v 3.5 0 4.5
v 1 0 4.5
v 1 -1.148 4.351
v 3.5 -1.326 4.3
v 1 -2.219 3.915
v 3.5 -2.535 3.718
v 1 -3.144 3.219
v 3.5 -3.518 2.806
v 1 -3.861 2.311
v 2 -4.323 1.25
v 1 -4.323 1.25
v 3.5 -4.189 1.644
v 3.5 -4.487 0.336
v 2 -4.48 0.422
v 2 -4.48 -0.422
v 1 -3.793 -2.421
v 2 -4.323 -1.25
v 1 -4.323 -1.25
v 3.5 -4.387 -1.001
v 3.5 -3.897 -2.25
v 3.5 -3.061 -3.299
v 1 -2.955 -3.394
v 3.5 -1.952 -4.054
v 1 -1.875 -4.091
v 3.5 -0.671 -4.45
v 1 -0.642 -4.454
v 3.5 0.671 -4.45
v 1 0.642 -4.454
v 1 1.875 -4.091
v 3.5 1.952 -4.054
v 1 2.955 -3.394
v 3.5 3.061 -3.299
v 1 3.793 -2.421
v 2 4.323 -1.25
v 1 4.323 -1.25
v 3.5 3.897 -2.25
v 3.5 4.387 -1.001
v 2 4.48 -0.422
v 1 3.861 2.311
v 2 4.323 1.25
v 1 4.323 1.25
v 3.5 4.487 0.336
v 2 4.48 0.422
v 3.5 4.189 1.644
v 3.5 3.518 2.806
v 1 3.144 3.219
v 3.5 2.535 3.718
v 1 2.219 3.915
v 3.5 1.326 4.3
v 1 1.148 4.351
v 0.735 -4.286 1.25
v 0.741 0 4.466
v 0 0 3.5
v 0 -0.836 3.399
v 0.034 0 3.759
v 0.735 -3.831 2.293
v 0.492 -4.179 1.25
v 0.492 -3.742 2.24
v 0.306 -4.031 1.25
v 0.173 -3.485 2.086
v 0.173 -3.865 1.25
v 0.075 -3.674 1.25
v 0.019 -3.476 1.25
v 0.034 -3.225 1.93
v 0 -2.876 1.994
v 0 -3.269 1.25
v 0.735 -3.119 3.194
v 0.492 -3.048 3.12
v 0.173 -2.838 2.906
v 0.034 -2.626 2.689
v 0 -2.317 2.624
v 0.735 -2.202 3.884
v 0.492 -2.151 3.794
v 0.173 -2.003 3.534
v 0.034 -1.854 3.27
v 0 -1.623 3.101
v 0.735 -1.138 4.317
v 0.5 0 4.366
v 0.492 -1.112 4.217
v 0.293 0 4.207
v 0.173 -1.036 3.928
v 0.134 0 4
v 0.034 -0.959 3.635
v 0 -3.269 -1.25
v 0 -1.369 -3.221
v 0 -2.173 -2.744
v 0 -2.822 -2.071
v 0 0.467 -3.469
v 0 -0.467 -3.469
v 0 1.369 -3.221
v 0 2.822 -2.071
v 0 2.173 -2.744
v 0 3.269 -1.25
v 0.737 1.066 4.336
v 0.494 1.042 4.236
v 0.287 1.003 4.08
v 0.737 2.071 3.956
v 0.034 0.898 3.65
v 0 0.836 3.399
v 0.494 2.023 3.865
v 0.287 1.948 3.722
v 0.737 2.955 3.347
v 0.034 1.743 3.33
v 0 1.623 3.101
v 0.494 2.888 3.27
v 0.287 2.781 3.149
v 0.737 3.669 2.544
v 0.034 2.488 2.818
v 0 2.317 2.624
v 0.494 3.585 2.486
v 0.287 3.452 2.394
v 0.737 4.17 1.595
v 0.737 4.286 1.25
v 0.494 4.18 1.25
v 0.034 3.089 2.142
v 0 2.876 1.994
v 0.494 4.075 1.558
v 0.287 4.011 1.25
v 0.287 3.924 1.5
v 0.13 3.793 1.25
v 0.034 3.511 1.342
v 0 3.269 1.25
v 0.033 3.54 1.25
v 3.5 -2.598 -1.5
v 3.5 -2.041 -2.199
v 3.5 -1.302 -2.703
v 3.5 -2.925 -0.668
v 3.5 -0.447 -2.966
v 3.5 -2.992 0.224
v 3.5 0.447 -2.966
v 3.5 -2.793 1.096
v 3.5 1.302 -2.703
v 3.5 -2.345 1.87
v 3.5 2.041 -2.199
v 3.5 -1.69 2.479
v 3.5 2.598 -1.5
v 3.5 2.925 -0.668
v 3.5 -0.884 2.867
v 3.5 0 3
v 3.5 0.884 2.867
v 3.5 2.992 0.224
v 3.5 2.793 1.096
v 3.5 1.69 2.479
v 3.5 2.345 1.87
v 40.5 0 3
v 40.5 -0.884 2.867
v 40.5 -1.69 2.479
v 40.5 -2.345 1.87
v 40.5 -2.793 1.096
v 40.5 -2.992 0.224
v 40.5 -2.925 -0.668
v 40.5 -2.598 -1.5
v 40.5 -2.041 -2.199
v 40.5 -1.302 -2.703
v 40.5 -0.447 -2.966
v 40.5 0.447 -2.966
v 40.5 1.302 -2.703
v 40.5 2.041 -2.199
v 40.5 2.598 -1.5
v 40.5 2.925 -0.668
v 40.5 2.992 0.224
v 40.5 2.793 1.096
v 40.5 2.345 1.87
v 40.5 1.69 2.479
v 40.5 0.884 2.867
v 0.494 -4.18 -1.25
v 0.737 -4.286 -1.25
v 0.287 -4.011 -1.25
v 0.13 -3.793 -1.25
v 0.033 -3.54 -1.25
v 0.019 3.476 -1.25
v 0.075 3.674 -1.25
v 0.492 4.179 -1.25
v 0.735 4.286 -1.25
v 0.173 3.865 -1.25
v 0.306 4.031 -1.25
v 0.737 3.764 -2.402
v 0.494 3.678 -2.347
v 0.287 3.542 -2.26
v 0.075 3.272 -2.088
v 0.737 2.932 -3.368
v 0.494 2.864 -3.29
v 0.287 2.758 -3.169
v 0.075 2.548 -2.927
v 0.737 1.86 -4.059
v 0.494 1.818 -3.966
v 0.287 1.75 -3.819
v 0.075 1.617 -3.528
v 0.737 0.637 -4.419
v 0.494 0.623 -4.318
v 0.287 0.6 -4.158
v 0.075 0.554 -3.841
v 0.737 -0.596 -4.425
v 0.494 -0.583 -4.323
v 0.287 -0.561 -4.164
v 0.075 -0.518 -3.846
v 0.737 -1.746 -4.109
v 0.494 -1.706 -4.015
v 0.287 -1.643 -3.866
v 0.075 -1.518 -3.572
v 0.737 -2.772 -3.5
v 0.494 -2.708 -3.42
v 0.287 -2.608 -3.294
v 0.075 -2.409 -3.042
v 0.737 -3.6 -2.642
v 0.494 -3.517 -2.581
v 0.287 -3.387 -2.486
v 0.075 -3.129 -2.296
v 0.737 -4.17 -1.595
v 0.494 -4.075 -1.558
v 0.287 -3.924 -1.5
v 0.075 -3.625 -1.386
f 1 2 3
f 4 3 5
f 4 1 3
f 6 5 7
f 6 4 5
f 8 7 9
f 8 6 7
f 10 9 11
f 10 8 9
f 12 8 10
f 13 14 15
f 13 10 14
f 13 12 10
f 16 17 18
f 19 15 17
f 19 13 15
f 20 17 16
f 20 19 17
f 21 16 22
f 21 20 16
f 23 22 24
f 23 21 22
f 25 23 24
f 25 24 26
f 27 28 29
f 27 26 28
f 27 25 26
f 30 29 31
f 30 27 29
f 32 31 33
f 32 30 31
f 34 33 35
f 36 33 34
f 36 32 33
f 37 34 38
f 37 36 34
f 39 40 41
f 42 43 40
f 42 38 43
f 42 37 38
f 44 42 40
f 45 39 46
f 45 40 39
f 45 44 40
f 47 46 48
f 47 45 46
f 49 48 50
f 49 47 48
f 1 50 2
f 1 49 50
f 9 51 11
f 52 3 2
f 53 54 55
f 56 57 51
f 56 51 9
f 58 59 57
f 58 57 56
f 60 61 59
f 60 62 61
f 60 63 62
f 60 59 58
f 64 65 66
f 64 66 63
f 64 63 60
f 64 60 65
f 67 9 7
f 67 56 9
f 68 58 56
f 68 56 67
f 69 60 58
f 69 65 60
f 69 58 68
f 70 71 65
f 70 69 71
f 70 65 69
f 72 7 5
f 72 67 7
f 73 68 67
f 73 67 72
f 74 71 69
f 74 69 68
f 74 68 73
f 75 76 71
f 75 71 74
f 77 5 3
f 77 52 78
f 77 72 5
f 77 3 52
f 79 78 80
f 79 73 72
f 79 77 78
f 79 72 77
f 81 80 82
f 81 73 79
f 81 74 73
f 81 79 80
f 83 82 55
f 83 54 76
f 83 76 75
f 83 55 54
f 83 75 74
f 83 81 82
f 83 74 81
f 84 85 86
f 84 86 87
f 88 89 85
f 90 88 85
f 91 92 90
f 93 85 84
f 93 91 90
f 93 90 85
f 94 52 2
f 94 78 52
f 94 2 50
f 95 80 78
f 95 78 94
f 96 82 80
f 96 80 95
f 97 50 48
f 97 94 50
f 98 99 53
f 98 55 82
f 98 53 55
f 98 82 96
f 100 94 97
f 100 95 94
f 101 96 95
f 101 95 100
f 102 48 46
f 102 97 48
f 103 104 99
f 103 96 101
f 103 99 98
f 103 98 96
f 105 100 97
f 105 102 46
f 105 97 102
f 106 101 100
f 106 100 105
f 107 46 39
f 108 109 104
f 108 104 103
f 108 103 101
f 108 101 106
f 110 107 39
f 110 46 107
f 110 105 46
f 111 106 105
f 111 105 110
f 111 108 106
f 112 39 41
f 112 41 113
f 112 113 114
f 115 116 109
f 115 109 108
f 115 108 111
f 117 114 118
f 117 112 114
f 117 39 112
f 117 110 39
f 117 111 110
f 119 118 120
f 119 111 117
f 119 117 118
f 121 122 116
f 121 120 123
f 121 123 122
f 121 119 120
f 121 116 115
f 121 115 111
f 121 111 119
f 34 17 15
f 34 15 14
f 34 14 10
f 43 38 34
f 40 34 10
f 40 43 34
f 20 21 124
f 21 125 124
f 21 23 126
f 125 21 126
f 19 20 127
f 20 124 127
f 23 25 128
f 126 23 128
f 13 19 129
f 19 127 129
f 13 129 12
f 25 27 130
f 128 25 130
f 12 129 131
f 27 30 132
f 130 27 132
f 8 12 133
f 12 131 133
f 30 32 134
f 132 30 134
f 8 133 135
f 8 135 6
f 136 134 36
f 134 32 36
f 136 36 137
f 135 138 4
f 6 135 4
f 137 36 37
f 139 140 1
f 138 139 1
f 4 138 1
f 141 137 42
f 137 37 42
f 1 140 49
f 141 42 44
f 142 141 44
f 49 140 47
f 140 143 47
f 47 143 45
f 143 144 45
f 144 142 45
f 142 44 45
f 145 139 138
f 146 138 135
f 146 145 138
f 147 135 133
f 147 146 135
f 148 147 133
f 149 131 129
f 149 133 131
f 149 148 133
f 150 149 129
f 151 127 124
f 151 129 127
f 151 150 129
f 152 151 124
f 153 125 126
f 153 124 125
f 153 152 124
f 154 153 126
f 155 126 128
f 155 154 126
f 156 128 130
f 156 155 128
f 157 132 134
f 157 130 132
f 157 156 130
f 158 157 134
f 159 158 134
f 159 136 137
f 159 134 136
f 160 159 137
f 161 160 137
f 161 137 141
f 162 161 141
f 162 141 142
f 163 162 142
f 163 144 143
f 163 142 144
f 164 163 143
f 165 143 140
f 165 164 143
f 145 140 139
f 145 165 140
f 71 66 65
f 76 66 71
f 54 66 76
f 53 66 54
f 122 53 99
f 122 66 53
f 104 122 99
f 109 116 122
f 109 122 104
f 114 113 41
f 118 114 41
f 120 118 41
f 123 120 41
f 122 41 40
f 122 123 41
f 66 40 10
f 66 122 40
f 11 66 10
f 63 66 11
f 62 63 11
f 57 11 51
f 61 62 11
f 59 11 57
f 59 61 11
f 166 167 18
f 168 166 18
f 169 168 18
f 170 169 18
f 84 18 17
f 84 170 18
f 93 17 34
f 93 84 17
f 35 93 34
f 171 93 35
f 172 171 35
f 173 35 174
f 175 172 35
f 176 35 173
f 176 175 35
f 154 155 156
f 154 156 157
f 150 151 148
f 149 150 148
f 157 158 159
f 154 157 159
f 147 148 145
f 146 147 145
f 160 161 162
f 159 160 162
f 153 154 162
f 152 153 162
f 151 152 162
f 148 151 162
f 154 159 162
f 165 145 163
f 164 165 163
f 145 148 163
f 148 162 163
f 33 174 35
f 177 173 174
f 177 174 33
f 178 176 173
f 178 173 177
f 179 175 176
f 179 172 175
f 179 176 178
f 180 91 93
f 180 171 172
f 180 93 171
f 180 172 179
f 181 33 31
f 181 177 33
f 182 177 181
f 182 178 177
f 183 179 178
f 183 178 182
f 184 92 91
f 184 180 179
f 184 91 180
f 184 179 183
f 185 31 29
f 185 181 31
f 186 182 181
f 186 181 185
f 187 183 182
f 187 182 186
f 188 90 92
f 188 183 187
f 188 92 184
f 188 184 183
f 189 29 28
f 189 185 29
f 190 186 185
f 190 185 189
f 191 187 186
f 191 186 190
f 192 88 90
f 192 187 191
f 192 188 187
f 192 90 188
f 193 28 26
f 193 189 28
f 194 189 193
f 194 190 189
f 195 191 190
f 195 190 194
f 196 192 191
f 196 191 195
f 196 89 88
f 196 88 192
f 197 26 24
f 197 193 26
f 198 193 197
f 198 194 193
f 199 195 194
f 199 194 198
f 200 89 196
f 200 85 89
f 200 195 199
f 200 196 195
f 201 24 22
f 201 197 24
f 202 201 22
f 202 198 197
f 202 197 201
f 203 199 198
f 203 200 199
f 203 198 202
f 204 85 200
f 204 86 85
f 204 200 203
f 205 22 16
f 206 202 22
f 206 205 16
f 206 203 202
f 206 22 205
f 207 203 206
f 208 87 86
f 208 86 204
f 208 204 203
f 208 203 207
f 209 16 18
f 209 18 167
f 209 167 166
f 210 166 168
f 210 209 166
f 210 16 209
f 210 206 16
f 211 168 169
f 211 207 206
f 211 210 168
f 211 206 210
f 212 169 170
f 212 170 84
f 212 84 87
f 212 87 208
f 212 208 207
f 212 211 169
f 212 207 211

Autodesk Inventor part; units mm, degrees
ref_plane "YZ Plane" through (0, 0, 0) normal (1, 0, 0) x (0, 1, 0)
ref_plane "XZ Plane" through (0, 0, 0) normal (0, 1, 0) x (-1, 0, 0)
ref_plane "XY Plane" through (0, 0, 0) normal (0, 0, 1) x (1, 0, 0)
sketch "Skizze1" plane through (0, 0, 0) normal (0, 1, 0) x (-1, 0, 0)
  line L0 (0, 0) -> (0, 4.5)
  line L1 (0, 4.5) -> (-3.5, 4.5)
  line L2 (-3.5, 4.5) -> (-3.5, 3)
  line L3 (-3.5, 3) -> (-40.5, 3)
  line L4 (-40.5, 3) -> (-40.5, 0)
  line L5 (-40.5, 0) -> (0, 0)
  dimension "d0" = 3.5
  dimension "d1" = 6
  dimension "d2" = 9
  dimension "d3" = 37
revolve "Umdrehung1" add sketch "Skizze1" angle 360 about axis through (40.5, 0, 0) along (-1, 0, 0)
thread "Gewinde1" size "M6x1" class "6g" standard "ISO Metric profile" length 12
sketch "Skizze2" plane through (0, 0, 0) normal (-1, 0, 0) x (0, 0, 1)
  line L0 (1.25, 4.3229) -> (1.25, -4.3229)
  line L1 (-1.25, -4.3229) -> (-1.25, 4.3229)
  circle A0 centre (0, 0) radius 4.5 projected
  line L2 (0, 4.5) -> (0, -4.5) construction
  point P0 (0, 0)
  dimension "d7" = 2.5
extrude "Extrusion1" cut sketch "Skizze2" against normal blind 2 contours L0 A0 L1
fillet "Rundung1" radius 1 3 edges at (0, 2.7042, 3.5969) (0, -2.7042, 3.5969) (0, 0, -4.5)
properties part number "screw" material "Steel, Cast"
